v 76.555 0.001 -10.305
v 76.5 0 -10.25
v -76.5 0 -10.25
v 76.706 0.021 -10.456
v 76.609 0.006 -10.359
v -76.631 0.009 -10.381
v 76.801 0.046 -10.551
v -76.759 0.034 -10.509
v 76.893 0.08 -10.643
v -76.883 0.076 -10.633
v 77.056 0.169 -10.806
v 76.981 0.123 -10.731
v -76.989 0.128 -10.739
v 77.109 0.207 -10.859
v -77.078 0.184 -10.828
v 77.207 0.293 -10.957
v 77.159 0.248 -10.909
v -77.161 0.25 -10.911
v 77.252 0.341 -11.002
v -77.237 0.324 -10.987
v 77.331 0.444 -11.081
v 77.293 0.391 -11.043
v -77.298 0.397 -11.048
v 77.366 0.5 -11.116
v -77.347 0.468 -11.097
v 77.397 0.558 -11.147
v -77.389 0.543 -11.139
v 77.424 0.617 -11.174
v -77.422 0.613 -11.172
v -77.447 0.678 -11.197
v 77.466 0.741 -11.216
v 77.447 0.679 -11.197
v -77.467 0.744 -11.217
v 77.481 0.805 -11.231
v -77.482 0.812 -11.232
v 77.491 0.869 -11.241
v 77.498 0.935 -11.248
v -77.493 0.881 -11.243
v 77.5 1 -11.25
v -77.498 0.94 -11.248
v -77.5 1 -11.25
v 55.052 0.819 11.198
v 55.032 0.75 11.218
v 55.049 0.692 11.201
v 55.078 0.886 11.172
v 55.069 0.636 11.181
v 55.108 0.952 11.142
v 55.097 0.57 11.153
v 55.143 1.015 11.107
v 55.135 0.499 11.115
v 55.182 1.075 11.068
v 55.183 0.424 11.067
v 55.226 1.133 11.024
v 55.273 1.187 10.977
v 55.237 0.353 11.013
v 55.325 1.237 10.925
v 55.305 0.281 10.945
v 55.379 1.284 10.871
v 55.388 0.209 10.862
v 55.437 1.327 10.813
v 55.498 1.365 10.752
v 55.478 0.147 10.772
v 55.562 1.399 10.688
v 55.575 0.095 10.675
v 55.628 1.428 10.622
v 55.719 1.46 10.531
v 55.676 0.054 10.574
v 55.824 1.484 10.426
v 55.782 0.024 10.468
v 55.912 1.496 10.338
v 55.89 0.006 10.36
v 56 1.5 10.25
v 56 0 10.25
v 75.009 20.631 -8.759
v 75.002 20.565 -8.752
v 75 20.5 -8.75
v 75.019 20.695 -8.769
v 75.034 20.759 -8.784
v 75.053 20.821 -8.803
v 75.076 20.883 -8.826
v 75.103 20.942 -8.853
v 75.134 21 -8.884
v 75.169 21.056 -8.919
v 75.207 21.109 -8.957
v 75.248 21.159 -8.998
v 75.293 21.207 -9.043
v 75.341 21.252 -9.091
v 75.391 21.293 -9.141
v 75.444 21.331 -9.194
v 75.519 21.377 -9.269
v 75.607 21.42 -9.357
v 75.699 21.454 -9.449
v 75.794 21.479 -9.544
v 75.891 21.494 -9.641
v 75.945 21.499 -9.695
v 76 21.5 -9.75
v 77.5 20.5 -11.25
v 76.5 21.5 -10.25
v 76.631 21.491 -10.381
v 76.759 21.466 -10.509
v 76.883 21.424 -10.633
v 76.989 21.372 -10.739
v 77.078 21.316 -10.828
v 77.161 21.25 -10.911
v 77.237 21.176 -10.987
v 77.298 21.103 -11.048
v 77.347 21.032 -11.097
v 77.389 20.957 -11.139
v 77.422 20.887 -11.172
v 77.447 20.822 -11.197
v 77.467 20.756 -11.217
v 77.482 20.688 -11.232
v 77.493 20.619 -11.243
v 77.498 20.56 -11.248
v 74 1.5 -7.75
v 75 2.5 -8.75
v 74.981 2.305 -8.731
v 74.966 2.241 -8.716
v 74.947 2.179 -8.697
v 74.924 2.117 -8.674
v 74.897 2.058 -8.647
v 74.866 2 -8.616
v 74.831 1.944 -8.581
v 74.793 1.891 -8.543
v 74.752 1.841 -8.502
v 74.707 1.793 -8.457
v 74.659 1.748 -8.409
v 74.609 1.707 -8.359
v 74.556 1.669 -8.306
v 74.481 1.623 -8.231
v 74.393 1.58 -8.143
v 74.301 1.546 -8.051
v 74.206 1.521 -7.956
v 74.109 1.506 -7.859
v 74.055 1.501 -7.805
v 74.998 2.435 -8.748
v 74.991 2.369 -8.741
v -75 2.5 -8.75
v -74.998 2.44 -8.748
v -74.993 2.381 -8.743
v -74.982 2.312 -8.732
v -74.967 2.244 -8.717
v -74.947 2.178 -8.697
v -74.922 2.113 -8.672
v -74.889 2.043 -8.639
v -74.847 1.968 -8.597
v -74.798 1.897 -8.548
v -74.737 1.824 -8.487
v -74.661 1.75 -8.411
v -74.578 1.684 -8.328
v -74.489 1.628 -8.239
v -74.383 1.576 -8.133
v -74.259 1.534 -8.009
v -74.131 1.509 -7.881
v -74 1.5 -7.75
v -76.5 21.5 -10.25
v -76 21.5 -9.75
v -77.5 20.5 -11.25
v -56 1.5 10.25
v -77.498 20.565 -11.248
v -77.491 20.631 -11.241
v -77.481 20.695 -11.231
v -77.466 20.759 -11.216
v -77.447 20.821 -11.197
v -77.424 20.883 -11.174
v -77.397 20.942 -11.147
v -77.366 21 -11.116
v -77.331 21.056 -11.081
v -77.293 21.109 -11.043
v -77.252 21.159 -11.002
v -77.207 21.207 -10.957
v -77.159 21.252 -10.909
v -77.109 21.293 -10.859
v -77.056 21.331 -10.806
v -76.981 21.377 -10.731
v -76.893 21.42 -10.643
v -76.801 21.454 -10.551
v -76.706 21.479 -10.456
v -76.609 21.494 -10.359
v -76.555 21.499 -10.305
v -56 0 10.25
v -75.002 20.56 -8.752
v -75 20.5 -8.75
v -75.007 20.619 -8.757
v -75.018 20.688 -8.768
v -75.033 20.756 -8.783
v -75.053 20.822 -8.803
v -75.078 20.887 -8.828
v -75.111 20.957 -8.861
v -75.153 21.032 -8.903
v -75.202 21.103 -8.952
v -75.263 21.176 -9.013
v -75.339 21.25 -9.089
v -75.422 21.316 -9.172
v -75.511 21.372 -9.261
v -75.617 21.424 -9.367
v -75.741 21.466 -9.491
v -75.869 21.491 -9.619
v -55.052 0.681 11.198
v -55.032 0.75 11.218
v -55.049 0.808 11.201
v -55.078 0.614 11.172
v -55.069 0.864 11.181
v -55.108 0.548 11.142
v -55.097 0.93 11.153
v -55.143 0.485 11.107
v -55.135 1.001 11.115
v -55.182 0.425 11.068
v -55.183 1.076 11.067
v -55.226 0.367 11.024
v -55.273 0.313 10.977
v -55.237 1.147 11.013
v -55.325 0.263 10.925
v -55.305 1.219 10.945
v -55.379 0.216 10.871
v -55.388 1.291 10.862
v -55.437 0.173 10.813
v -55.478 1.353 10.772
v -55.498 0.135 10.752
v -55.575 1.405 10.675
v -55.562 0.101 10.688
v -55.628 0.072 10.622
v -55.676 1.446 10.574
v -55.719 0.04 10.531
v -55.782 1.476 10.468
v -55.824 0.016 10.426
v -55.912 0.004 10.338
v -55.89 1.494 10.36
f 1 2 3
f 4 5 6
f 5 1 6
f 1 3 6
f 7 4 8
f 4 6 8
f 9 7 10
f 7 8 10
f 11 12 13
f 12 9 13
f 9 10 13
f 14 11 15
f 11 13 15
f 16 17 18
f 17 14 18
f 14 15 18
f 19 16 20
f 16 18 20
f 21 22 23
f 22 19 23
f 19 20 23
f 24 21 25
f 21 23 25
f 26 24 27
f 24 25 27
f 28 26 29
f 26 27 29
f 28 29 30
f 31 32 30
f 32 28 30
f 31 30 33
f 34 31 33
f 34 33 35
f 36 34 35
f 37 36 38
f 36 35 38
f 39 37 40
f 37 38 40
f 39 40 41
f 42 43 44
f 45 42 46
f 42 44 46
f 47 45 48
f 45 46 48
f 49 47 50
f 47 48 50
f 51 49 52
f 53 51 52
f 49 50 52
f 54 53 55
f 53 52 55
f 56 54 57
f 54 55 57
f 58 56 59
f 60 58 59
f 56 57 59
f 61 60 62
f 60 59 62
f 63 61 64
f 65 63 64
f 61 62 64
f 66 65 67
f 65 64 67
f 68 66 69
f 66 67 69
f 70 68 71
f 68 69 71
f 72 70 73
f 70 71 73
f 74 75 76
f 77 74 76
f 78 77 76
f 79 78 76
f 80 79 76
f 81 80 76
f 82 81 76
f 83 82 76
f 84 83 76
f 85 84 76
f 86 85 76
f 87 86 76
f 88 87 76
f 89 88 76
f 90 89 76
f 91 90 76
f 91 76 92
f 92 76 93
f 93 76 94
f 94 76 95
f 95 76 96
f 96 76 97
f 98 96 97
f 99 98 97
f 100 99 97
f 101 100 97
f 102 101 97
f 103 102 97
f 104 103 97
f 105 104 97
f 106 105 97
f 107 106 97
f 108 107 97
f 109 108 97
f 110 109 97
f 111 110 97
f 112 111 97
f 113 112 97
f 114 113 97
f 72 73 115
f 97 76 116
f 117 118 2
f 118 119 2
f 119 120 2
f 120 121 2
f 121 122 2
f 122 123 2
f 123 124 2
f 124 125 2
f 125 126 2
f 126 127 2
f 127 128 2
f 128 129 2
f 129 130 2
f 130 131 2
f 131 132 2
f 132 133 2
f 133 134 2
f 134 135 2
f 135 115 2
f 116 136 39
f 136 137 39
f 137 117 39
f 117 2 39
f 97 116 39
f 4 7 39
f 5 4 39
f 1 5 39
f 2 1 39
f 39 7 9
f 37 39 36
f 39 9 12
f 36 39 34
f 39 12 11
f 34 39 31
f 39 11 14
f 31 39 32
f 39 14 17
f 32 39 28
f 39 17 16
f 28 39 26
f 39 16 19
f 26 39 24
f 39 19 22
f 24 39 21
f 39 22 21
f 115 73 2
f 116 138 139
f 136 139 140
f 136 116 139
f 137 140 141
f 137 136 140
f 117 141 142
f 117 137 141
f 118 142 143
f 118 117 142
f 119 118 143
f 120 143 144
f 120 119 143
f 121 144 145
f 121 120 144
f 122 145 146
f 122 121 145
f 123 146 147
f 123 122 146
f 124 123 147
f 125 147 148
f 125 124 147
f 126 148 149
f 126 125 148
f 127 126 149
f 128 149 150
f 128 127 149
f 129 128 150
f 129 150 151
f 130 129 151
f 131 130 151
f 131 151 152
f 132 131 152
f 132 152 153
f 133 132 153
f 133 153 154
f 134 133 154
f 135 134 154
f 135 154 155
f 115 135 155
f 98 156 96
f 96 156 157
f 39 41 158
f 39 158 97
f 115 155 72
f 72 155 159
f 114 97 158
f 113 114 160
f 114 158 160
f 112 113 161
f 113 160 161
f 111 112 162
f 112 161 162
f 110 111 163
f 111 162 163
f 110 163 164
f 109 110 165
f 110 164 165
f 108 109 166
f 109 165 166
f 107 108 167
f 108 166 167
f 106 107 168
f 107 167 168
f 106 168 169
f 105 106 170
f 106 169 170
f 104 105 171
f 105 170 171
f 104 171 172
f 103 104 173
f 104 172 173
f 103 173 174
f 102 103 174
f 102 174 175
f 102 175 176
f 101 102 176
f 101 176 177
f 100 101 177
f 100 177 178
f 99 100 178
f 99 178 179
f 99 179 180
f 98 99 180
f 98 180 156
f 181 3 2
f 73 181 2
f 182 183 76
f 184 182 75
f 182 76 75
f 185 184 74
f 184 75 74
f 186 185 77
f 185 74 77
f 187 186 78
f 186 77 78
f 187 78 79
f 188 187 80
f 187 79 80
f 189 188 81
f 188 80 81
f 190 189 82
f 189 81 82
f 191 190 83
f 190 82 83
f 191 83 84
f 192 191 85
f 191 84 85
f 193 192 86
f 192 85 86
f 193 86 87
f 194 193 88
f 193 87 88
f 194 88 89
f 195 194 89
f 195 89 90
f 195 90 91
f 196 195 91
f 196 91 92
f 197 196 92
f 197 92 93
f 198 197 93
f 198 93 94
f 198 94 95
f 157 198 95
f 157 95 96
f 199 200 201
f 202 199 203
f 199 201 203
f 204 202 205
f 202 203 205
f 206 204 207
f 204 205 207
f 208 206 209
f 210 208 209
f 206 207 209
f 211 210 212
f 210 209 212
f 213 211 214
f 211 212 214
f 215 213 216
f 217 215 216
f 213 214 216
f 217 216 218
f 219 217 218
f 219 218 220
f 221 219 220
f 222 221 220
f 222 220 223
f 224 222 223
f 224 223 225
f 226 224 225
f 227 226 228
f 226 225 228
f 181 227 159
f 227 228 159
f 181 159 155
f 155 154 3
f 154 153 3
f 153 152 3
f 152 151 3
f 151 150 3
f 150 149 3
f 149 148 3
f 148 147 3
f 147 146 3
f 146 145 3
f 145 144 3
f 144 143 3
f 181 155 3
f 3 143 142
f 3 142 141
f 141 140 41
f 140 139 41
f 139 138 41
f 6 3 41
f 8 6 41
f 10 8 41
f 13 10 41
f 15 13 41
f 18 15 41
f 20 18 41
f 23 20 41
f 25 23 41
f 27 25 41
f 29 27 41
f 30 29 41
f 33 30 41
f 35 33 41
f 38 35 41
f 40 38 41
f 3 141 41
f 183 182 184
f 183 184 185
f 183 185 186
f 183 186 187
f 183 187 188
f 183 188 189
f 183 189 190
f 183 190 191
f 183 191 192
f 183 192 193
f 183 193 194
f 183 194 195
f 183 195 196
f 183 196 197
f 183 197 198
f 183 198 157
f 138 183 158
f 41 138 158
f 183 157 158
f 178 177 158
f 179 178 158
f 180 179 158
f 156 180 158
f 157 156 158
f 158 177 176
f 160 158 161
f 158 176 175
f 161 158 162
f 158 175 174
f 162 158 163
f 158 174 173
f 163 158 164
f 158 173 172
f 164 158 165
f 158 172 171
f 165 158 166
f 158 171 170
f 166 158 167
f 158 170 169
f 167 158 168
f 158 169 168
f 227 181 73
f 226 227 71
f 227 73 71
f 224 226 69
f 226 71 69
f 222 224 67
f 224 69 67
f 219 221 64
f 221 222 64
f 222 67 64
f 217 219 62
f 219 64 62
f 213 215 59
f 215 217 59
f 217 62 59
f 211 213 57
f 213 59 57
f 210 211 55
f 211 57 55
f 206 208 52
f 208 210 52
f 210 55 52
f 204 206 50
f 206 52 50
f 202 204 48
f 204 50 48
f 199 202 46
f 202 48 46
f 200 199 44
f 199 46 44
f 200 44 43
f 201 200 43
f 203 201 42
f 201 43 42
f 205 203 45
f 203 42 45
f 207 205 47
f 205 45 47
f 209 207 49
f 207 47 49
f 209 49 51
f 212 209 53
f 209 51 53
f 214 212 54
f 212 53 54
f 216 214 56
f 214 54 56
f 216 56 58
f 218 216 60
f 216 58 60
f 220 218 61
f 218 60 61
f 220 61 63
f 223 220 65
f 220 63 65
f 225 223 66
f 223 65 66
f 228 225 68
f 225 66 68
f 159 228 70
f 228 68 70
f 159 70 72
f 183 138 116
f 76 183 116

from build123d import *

# Parameters (mm, degrees)
SKETCH1_W           = 155
SKETCH1_H           = 22.5
BOSS_EXTRUDE1_DEPTH = 1.5
SKETCH2_W           = 155
SKETCH2_H           = 2.5
BOSS_EXTRUDE2_DEPTH = 20
CUT_EXTRUDE2_DEPTH  = 82.209990149
FILLET1_R           = 1


with BuildPart() as part:
    # Sketch1 → Boss-Extrude1 (new body)
    with BuildSketch(Plane(origin=(0, 0, 0), x_dir=(1, 0, 0), z_dir=(0, 1, 0))):
        Rectangle(SKETCH1_W, SKETCH1_H)
    extrude(amount=BOSS_EXTRUDE1_DEPTH)

    # Sketch2 → Boss-Extrude2 (add)
    with BuildSketch(Plane(origin=(0, 1.5, 0), x_dir=(1, 0, 0), z_dir=(0, 1, 0))):
        with Locations((0, 10)):
            Rectangle(SKETCH2_W, SKETCH2_H)
    extrude(amount=BOSS_EXTRUDE2_DEPTH)

    # Sketch3 → Cut-Extrude2 (cut, through all)
    with BuildSketch(Plane(origin=(0, 0, 0), x_dir=(-1, 0, 0), z_dir=(0, -1, 0))):
        Polygon((-77.5, -11.25), (-55, -11.25), (-77.5, 11.25), align=None)
        Polygon((77.5, -11.25), (77.5, 11.25), (55, -11.25), align=None)
    extrude(amount=-CUT_EXTRUDE2_DEPTH, mode=Mode.SUBTRACT)

    # Fillet1
    # the kernel refuses this fillet: 1 mm, written as the material it adds along each edge
    with BuildSketch(Plane(origin=(77.5, 1.5, -8.75), x_dir=(0, 0, 1), z_dir=(-1, 0, 0))) as fillet1_piece_1_section:
        with BuildLine():
            CenterArc((FILLET1_R, FILLET1_R), FILLET1_R, 180, 90)
            Line((0, FILLET1_R), (0, 0))
            Line((0, 0), (FILLET1_R, 0))
        make_face()
    fillet1_piece_1 = extrude(amount=155, mode=Mode.PRIVATE)
    fillet1_piece_1 = split(fillet1_piece_1, bisect_by=Plane(origin=(-37.387113225, 1.726762312, 28.862886775), z_dir=(0.7071067811865436, 0, -0.7071067811865515)), keep=Keep.TOP, mode=Mode.PRIVATE)
    fillet1_piece_1 = split(fillet1_piece_1, bisect_by=Plane(origin=(37.387113225, 1.726762312, 28.862886775), z_dir=(-0.7071067811865492, 0, -0.7071067811865458)), keep=Keep.TOP, mode=Mode.PRIVATE)
    add(fillet1_piece_1)
    # the kernel refuses this fillet: 1 mm, written as the material it takes off along each edge
    with BuildSketch(Plane(origin=(-80, 0, -11.25), x_dir=(0, 1, 0), z_dir=(1, 0, 0))) as fillet1_2_piece_1:
        with BuildLine():
            CenterArc((FILLET1_R, FILLET1_R), FILLET1_R, 180, 90)
            Line((0, FILLET1_R), (0, 0))
            Line((0, 0), (FILLET1_R, 0))
        make_face()
    extrude(amount=160, mode=Mode.SUBTRACT)
    with BuildSketch(Plane(origin=(-80, 21.5, -11.25), x_dir=(0, -1, 0), z_dir=(1, 0, 0))) as fillet1_2_piece_2:
        with BuildLine():
            CenterArc((FILLET1_R, -FILLET1_R), FILLET1_R, 90, 90)
            Line((0, -FILLET1_R), (0, 0))
            Line((0, 0), (FILLET1_R, 0))
        make_face()
    extrude(amount=160, mode=Mode.SUBTRACT)
    with BuildSketch(Plane(origin=(57.5, 0, 11.25), x_dir=(0, 0, -1), z_dir=(-1, 0, 0)), Plane(origin=(57.5, 1.5, 11.25), x_dir=(0, -1, 0), z_dir=(-1, 0, 0))) as fillet1_2_piece_3:
        with BuildLine():
            CenterArc((FILLET1_R, -FILLET1_R), FILLET1_R, 90, 90)
            Line((0, -FILLET1_R), (0, 0))
            Line((0, 0), (FILLET1_R, 0))
        make_face()
    extrude(amount=115, mode=Mode.SUBTRACT)
    with BuildSketch(Plane(origin=(77.5, 21.5, -8.75), x_dir=(0, 0, -1), z_dir=(-1, 0, 0))) as fillet1_2_piece_4:
        with BuildLine():
            CenterArc((FILLET1_R, FILLET1_R), FILLET1_R, 180, 90)
            Line((0, FILLET1_R), (0, 0))
            Line((0, 0), (FILLET1_R, 0))
        make_face()
    extrude(amount=155, mode=Mode.SUBTRACT)


solid = part.part
